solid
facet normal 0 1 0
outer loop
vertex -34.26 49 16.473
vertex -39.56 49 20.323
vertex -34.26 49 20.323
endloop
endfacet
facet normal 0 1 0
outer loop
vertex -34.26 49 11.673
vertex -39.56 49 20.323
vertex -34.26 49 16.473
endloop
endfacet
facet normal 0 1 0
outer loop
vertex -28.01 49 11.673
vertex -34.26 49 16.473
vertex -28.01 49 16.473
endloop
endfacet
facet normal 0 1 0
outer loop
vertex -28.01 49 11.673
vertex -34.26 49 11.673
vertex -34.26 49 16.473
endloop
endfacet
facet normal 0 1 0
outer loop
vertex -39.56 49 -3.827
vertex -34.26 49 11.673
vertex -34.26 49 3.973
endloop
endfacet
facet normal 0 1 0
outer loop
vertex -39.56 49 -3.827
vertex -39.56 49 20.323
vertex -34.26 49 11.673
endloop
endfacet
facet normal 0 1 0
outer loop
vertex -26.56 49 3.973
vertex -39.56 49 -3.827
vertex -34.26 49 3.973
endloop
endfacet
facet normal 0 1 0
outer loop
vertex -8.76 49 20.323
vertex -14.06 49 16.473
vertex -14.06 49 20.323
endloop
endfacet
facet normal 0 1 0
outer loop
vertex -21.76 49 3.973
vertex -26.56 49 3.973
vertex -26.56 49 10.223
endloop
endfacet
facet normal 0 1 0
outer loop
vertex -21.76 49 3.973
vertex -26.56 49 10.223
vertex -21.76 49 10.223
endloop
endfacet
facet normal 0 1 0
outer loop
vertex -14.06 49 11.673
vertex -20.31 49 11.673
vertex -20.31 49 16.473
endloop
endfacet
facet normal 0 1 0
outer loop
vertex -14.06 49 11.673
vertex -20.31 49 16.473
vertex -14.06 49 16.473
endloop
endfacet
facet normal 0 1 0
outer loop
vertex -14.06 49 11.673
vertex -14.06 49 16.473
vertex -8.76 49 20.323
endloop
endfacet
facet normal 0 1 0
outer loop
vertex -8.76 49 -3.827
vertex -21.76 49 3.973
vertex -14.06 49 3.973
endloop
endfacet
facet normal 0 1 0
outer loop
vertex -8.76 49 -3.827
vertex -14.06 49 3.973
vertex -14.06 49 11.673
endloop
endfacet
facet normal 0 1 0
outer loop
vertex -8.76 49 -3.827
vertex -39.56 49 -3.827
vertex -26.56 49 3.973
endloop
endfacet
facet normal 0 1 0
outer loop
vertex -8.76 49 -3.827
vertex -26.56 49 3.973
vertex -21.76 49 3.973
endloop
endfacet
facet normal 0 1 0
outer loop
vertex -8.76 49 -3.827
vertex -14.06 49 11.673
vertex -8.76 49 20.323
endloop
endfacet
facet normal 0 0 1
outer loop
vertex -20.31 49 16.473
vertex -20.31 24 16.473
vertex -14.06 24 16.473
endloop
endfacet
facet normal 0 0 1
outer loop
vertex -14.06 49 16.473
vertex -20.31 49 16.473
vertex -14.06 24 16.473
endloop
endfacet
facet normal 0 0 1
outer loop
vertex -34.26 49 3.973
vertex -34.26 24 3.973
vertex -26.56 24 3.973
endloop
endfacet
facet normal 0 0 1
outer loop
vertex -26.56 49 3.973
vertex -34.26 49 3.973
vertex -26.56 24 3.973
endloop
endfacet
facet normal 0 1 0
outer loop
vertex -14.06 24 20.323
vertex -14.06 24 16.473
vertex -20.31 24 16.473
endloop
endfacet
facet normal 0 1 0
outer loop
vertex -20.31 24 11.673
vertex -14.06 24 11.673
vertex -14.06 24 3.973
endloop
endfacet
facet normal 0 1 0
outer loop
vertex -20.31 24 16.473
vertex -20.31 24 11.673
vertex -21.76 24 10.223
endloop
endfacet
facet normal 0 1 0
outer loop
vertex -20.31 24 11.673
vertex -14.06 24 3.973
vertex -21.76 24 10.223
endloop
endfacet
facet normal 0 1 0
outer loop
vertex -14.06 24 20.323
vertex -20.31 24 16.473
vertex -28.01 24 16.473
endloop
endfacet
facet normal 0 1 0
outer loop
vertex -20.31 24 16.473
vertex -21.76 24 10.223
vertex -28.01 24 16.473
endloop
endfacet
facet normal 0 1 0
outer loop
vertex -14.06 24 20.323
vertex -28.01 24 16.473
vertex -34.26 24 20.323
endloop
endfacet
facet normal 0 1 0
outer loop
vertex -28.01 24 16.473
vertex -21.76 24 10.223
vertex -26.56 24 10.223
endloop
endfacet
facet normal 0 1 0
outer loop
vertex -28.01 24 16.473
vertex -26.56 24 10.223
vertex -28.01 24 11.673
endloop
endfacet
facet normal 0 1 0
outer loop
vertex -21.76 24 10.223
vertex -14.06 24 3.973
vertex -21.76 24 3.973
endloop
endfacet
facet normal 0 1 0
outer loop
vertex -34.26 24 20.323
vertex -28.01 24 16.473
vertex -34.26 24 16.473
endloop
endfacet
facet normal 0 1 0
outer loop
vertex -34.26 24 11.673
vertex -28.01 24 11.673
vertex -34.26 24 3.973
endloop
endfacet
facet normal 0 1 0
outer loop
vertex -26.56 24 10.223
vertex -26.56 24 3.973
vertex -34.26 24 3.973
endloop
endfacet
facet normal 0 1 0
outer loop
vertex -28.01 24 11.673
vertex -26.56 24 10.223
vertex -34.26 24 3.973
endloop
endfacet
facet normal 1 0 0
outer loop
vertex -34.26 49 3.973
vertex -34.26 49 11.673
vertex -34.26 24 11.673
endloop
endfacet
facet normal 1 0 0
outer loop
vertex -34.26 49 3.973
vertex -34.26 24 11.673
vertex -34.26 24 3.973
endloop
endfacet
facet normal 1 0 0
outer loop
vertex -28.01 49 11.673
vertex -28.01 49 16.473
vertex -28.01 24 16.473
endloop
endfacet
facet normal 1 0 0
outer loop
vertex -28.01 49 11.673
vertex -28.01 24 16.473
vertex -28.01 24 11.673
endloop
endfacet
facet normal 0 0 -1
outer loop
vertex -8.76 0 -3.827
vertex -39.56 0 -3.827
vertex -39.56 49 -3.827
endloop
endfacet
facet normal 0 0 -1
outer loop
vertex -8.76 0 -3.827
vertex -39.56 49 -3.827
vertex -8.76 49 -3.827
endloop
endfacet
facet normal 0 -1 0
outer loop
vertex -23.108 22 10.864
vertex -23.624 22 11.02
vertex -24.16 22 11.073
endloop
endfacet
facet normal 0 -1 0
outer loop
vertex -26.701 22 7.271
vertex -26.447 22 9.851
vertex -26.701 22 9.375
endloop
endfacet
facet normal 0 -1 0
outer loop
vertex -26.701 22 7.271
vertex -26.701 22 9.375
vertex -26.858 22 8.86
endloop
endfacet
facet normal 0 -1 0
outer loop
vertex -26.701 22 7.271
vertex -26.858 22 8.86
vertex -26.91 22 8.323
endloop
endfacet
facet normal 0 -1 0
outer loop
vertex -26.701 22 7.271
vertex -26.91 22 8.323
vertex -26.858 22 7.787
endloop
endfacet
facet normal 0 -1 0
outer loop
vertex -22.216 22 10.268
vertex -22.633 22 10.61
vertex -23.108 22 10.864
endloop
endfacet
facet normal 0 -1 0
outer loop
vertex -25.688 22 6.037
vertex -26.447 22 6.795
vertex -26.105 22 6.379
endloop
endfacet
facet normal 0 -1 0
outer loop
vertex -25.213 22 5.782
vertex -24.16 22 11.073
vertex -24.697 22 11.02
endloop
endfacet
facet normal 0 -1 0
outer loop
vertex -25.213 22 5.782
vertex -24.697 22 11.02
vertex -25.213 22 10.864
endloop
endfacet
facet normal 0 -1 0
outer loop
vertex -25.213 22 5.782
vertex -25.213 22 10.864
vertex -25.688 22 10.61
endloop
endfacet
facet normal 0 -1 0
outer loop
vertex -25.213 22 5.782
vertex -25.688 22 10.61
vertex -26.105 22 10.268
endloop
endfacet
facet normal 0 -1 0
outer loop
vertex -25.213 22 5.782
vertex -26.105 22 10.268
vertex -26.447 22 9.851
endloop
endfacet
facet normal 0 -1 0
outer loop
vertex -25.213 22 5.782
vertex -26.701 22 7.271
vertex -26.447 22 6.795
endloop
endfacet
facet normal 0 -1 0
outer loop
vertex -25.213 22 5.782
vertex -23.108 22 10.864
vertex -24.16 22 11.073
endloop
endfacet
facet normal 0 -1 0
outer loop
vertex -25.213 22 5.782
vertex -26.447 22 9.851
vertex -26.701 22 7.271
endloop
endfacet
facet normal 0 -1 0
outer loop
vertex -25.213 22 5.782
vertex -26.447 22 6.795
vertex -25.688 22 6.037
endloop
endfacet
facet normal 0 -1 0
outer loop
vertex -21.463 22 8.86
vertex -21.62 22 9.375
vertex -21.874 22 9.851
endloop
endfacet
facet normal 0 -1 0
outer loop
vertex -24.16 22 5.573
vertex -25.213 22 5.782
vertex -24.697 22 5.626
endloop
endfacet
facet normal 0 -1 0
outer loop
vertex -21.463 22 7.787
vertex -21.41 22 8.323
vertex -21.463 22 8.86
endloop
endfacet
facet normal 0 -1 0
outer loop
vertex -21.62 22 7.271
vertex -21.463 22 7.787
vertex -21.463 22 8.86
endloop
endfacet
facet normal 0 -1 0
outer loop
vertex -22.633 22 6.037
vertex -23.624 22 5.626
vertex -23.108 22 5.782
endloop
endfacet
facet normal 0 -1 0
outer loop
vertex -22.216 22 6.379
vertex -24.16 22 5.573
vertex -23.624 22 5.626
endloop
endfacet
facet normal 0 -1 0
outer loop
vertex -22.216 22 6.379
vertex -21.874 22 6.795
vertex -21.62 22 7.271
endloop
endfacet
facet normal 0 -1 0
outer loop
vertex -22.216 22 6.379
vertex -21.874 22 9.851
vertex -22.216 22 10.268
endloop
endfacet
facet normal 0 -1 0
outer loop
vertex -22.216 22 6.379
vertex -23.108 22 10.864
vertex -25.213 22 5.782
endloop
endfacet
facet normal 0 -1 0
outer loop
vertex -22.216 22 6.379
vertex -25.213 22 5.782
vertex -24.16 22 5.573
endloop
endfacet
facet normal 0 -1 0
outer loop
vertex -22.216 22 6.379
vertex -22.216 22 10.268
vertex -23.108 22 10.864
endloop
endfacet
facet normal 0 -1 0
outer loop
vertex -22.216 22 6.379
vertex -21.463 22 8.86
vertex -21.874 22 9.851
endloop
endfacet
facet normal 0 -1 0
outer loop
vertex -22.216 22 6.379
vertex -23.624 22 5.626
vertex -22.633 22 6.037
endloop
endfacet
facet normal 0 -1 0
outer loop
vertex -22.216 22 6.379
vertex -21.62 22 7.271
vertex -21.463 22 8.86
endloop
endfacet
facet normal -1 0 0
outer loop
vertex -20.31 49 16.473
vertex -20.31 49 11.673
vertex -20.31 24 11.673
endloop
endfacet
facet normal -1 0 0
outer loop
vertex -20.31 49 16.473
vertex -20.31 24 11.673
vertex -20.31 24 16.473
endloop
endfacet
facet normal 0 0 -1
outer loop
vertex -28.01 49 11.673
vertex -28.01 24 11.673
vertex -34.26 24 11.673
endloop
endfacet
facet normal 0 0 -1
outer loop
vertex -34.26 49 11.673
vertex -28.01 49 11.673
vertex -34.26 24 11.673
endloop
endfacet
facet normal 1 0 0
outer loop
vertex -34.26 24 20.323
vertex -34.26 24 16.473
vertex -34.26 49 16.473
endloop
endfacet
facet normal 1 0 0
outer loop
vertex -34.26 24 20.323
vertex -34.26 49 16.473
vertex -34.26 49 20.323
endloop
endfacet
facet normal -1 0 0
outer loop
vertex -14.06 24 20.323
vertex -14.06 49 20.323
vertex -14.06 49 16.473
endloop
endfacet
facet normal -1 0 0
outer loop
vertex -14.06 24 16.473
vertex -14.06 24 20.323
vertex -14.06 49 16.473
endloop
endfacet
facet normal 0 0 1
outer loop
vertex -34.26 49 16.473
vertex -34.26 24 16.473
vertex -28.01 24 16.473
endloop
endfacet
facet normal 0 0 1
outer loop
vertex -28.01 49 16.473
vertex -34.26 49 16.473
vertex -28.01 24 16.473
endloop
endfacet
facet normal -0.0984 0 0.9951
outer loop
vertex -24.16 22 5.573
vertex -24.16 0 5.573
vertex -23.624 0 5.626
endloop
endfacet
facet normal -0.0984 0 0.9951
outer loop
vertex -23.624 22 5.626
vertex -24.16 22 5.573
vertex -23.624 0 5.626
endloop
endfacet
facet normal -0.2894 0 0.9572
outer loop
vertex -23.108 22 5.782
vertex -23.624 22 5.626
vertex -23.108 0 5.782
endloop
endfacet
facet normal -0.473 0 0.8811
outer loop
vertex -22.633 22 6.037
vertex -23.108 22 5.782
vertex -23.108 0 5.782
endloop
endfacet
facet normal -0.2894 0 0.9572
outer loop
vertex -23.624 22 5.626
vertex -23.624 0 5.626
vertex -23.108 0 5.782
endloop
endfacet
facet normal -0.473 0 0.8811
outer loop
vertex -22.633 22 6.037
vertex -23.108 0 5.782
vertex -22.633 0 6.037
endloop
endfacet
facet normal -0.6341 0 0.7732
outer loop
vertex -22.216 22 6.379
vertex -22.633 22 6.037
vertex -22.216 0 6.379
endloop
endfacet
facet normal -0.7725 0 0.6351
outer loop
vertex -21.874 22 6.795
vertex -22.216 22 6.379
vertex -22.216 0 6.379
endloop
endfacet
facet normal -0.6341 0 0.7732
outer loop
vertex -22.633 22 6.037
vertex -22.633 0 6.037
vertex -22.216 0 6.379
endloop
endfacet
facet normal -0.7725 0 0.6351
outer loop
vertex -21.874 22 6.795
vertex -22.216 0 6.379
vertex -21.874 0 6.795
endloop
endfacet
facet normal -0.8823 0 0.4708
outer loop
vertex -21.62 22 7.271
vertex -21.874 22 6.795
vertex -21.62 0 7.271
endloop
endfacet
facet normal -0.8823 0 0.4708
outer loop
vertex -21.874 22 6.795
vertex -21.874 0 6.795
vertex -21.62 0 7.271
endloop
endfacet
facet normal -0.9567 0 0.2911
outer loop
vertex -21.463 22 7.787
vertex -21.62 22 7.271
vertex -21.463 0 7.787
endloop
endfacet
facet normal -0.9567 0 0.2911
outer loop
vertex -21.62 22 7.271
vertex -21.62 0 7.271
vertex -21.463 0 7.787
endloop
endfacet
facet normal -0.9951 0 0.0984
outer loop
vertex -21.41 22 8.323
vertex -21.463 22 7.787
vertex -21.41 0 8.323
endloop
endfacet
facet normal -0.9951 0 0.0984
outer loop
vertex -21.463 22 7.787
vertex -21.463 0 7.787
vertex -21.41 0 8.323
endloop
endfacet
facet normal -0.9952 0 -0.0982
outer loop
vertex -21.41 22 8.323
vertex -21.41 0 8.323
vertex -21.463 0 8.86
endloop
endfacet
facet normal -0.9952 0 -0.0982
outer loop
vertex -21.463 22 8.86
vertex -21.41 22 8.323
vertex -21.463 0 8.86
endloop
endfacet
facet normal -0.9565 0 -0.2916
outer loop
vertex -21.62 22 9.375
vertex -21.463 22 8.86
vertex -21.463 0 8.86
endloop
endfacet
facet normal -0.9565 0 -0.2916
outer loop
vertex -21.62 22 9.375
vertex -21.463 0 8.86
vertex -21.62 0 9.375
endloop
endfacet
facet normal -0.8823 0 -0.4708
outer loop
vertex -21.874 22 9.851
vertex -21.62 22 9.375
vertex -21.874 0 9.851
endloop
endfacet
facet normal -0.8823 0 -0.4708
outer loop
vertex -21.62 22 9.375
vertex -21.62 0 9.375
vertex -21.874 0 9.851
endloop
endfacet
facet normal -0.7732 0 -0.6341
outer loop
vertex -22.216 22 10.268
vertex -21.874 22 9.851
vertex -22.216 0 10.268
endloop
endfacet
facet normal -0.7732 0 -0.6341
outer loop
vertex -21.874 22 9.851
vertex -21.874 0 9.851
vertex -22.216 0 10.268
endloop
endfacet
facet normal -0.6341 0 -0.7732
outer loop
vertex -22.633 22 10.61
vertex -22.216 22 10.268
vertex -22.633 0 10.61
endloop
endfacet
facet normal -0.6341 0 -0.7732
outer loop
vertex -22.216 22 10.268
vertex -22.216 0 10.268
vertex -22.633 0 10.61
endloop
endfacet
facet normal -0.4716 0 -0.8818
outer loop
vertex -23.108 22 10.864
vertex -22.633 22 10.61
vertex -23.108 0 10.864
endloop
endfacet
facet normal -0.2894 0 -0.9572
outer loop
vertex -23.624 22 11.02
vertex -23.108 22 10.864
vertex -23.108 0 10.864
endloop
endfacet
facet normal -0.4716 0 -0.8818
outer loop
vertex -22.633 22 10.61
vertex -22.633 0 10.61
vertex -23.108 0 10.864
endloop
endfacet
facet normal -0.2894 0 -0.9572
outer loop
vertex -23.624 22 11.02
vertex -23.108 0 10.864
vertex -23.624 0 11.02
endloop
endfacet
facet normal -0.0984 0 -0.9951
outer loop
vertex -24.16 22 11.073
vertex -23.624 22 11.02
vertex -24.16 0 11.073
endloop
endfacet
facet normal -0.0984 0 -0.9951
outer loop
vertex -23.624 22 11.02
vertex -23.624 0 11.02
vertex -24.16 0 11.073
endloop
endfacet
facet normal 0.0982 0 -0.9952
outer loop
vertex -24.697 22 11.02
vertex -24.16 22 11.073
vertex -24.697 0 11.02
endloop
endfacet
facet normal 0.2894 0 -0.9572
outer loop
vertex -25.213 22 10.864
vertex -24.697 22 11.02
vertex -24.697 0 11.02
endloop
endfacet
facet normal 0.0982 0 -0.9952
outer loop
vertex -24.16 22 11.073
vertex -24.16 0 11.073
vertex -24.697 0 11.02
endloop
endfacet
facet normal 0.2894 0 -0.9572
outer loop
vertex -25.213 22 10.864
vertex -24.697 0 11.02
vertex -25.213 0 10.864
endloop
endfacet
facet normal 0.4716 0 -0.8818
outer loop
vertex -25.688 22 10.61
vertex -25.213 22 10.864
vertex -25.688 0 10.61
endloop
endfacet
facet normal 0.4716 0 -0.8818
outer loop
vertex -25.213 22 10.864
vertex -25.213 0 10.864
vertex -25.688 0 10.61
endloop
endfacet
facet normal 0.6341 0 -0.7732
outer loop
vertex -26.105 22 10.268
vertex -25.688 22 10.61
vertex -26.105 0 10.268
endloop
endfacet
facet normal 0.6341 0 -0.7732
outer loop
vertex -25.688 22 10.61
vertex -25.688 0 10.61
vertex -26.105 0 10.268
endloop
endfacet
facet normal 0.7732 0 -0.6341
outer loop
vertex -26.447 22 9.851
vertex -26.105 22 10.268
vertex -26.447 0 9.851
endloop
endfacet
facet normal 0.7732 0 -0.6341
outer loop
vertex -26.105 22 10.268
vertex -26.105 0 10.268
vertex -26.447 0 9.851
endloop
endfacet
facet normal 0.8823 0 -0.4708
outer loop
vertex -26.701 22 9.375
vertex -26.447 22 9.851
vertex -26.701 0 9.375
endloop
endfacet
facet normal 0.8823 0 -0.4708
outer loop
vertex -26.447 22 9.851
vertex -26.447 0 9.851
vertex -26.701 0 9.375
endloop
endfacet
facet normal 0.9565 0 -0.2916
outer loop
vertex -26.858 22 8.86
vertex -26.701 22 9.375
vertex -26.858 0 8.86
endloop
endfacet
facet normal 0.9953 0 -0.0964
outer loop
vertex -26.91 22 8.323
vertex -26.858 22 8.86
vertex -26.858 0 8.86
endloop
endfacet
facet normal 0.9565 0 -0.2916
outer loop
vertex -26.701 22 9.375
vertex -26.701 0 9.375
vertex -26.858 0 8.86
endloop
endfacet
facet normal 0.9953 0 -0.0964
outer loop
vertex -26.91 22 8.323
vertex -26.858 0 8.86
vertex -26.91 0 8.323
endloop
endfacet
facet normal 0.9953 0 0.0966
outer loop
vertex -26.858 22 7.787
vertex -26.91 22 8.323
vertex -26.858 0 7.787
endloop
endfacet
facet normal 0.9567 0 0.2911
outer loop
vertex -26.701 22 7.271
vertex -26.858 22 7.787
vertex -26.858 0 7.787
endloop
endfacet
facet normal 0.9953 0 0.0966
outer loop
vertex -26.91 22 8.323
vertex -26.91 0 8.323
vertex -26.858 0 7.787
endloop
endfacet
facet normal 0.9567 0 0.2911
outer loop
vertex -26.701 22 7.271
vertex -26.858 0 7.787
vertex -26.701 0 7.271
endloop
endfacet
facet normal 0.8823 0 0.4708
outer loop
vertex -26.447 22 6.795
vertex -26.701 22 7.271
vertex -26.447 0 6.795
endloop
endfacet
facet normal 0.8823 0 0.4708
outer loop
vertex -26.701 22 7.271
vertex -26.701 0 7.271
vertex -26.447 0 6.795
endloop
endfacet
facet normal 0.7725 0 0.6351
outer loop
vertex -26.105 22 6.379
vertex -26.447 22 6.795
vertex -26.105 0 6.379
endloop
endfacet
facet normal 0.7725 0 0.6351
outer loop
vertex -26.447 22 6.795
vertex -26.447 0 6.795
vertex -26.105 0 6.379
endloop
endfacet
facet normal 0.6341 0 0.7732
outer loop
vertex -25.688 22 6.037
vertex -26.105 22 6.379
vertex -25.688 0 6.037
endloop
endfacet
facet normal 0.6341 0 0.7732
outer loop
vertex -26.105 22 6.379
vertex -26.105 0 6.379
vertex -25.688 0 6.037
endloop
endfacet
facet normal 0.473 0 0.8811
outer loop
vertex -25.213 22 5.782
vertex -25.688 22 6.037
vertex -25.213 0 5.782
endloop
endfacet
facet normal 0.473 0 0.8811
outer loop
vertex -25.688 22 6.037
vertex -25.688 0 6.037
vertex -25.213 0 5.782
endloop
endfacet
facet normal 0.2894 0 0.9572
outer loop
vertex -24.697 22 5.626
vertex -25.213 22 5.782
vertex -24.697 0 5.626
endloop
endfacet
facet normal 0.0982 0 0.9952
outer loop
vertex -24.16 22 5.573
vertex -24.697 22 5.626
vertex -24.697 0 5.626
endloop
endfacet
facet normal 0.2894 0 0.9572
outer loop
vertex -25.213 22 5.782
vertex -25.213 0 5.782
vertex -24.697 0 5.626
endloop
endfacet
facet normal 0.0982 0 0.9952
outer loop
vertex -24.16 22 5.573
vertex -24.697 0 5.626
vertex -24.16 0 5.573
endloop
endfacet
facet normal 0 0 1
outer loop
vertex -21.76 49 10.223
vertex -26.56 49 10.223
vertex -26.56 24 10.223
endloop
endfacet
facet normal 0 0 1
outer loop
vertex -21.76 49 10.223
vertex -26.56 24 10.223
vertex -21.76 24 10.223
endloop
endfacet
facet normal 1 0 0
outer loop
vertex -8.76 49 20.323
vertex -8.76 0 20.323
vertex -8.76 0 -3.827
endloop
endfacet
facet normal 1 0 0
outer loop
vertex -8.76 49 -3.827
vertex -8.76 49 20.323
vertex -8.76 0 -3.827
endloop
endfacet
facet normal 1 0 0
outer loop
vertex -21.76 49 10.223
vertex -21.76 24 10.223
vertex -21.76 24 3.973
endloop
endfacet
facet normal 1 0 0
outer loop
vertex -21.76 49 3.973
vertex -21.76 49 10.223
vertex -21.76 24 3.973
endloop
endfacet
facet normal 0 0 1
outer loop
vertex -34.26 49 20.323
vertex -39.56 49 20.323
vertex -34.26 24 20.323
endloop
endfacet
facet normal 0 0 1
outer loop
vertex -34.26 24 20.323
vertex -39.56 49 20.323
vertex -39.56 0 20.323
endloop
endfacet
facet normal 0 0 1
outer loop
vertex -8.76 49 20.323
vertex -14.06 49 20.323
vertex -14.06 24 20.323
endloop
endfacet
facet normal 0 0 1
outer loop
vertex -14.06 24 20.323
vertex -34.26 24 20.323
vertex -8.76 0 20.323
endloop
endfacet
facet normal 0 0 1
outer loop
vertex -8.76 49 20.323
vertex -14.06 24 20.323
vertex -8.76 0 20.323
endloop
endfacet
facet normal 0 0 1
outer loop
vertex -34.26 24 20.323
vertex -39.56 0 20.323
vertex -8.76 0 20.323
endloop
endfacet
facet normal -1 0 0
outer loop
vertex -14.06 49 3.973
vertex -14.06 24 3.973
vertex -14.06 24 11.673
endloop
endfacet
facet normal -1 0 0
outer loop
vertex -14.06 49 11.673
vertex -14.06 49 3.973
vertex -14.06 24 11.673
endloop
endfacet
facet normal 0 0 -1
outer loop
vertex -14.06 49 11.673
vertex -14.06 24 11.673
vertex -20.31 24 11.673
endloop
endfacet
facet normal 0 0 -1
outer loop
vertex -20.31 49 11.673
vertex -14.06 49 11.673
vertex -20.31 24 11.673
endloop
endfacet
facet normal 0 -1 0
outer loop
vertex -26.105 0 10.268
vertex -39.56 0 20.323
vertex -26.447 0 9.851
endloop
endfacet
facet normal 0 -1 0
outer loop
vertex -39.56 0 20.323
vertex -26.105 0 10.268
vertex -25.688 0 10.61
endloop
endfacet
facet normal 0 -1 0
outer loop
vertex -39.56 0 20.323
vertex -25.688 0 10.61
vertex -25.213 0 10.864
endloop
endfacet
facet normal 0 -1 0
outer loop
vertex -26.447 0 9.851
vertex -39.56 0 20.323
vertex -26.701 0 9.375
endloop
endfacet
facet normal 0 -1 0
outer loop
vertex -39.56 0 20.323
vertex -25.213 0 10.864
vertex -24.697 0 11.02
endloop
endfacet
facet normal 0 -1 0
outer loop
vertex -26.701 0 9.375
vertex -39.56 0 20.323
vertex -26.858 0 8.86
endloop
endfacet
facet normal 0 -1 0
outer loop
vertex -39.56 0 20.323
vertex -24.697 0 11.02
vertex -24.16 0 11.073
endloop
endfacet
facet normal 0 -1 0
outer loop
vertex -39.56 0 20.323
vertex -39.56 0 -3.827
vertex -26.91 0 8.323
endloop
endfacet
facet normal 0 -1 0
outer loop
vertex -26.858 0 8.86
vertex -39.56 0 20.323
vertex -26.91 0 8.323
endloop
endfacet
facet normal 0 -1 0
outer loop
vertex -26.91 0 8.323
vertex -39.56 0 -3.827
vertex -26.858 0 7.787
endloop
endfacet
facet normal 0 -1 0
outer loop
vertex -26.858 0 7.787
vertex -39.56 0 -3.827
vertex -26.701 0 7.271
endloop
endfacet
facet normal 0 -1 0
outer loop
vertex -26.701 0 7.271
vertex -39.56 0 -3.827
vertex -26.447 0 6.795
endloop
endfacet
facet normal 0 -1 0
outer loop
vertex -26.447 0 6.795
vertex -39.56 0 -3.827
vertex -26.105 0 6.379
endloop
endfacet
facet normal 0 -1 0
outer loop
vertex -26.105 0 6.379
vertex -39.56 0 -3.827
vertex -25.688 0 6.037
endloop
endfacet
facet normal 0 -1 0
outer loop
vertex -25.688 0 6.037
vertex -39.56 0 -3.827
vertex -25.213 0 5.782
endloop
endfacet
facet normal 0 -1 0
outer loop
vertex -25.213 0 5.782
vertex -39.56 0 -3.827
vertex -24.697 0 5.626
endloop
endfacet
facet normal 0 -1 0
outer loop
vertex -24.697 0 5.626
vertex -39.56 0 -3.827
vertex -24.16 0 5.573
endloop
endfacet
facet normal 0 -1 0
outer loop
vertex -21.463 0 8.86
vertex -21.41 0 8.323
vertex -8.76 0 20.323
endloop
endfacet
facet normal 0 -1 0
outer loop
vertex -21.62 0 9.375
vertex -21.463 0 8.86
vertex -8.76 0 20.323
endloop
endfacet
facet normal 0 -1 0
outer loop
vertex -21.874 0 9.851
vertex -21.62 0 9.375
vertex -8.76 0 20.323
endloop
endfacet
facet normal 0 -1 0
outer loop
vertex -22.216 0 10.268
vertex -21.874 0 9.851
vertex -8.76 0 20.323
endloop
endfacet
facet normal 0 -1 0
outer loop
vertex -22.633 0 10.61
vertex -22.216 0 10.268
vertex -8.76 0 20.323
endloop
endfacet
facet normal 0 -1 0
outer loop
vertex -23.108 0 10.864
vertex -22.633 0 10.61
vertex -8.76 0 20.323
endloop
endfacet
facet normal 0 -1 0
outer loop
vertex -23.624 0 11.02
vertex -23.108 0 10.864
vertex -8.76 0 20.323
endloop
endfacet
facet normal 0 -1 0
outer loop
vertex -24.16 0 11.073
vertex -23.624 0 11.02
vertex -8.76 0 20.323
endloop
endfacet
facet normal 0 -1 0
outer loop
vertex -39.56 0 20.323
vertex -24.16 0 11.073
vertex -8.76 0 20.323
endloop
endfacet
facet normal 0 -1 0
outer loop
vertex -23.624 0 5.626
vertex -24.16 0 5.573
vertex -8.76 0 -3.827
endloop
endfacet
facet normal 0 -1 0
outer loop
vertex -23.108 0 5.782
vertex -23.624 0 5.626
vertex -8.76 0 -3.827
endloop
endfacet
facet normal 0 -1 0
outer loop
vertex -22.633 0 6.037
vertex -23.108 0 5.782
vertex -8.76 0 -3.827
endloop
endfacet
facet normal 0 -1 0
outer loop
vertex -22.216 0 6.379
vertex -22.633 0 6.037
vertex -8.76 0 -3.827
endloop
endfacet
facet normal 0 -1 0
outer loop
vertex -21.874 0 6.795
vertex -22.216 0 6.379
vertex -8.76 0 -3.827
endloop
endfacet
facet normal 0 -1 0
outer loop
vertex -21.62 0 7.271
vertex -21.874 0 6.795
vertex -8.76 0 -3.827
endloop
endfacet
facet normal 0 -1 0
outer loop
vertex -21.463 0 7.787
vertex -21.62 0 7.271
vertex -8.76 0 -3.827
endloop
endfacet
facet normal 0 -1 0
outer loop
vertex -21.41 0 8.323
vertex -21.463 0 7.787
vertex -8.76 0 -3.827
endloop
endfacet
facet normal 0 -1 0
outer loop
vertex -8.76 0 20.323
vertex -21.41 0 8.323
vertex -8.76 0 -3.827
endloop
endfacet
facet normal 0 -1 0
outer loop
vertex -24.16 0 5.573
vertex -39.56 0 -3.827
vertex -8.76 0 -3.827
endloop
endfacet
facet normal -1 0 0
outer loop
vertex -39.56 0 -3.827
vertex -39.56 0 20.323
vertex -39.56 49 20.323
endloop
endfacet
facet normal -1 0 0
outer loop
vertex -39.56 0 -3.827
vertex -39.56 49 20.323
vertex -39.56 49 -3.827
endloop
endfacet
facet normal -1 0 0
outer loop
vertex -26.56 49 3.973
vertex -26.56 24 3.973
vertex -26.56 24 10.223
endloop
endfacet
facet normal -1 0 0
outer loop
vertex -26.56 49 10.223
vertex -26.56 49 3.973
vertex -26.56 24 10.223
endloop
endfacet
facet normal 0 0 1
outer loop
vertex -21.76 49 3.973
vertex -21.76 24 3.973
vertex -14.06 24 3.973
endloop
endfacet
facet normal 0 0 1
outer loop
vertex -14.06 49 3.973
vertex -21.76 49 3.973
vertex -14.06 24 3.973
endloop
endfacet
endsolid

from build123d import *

# Parameters (mm, degrees)
ESQUISSE1_W                  = 30.8
ESQUISSE1_H                  = 24.15
BOSS_EXTRU_1_DEPTH           = 49
ESQUISSE3_R                  = 2.75
ENL_V_MAT_EXTRU_3_DEPTH      = 22
ENL_V_MAT_EXTRU_4_DEPTH      = 67.174451426
ENL_V_MAT_EXTRU_4_DEPTH_BACK = 25


with BuildPart() as part:
    # Esquisse1 → Boss.-Extru.1 (new body)
    with BuildSketch(Plane(origin=(0, 0, 0), x_dir=(1, 0, 0), z_dir=(0, 1, 0))):
        with Locations((-24.160479042, -8.248053892)):
            Rectangle(ESQUISSE1_W, ESQUISSE1_H)
    extrude(amount=BOSS_EXTRU_1_DEPTH)

    # Esquisse3 → Enlèv. mat.-Extru.3 (cut)
    with BuildSketch(Plane(origin=(0, 0, 0), x_dir=(-1, 0, 0), z_dir=(0, -1, 0))):
        with Locations(Location((24.160479042, -8.323053892, 0), (0, 0, 90))):
            Circle(ESQUISSE3_R)
    extrude(amount=-ENL_V_MAT_EXTRU_3_DEPTH, mode=Mode.SUBTRACT)

    # Esquisse2 → Enlèv. mat.-Extru.4 (cut, two sides: drawn at the far end of the back side and taken through both)
    with BuildSketch(Plane(origin=(0, 49, 0), x_dir=(1, 0, 0), z_dir=(0, 1, 0)).offset(-ENL_V_MAT_EXTRU_4_DEPTH_BACK)):
        Polygon((-34.260479042, -100.564708201), (-34.260479042, -20.323053892), (-34.260479042, -16.473053892), (-28.010479042, -16.473053892), (-28.010479042, -11.673053892), (-34.260479042, -11.673053892), (-34.260479042, -3.973053892), (-26.560479042, -3.973053892), (-26.560479042, -10.223053892), (-21.760479042, -10.223053892), (-21.760479042, -3.973053892), (-14.060479042, -3.973053892), (-14.060479042, -11.673053892), (-20.310479042, -11.673053892), (-20.310479042, -16.473053892), (-14.060479042, -16.473053892), (-14.060479042, -20.323053892), (-14.060479042, -100.564708201), (-14.060479042, -261.048016818), (-34.260479042, -261.048016818), align=None)
    extrude(amount=ENL_V_MAT_EXTRU_4_DEPTH + ENL_V_MAT_EXTRU_4_DEPTH_BACK, mode=Mode.SUBTRACT)


solid = part.part
